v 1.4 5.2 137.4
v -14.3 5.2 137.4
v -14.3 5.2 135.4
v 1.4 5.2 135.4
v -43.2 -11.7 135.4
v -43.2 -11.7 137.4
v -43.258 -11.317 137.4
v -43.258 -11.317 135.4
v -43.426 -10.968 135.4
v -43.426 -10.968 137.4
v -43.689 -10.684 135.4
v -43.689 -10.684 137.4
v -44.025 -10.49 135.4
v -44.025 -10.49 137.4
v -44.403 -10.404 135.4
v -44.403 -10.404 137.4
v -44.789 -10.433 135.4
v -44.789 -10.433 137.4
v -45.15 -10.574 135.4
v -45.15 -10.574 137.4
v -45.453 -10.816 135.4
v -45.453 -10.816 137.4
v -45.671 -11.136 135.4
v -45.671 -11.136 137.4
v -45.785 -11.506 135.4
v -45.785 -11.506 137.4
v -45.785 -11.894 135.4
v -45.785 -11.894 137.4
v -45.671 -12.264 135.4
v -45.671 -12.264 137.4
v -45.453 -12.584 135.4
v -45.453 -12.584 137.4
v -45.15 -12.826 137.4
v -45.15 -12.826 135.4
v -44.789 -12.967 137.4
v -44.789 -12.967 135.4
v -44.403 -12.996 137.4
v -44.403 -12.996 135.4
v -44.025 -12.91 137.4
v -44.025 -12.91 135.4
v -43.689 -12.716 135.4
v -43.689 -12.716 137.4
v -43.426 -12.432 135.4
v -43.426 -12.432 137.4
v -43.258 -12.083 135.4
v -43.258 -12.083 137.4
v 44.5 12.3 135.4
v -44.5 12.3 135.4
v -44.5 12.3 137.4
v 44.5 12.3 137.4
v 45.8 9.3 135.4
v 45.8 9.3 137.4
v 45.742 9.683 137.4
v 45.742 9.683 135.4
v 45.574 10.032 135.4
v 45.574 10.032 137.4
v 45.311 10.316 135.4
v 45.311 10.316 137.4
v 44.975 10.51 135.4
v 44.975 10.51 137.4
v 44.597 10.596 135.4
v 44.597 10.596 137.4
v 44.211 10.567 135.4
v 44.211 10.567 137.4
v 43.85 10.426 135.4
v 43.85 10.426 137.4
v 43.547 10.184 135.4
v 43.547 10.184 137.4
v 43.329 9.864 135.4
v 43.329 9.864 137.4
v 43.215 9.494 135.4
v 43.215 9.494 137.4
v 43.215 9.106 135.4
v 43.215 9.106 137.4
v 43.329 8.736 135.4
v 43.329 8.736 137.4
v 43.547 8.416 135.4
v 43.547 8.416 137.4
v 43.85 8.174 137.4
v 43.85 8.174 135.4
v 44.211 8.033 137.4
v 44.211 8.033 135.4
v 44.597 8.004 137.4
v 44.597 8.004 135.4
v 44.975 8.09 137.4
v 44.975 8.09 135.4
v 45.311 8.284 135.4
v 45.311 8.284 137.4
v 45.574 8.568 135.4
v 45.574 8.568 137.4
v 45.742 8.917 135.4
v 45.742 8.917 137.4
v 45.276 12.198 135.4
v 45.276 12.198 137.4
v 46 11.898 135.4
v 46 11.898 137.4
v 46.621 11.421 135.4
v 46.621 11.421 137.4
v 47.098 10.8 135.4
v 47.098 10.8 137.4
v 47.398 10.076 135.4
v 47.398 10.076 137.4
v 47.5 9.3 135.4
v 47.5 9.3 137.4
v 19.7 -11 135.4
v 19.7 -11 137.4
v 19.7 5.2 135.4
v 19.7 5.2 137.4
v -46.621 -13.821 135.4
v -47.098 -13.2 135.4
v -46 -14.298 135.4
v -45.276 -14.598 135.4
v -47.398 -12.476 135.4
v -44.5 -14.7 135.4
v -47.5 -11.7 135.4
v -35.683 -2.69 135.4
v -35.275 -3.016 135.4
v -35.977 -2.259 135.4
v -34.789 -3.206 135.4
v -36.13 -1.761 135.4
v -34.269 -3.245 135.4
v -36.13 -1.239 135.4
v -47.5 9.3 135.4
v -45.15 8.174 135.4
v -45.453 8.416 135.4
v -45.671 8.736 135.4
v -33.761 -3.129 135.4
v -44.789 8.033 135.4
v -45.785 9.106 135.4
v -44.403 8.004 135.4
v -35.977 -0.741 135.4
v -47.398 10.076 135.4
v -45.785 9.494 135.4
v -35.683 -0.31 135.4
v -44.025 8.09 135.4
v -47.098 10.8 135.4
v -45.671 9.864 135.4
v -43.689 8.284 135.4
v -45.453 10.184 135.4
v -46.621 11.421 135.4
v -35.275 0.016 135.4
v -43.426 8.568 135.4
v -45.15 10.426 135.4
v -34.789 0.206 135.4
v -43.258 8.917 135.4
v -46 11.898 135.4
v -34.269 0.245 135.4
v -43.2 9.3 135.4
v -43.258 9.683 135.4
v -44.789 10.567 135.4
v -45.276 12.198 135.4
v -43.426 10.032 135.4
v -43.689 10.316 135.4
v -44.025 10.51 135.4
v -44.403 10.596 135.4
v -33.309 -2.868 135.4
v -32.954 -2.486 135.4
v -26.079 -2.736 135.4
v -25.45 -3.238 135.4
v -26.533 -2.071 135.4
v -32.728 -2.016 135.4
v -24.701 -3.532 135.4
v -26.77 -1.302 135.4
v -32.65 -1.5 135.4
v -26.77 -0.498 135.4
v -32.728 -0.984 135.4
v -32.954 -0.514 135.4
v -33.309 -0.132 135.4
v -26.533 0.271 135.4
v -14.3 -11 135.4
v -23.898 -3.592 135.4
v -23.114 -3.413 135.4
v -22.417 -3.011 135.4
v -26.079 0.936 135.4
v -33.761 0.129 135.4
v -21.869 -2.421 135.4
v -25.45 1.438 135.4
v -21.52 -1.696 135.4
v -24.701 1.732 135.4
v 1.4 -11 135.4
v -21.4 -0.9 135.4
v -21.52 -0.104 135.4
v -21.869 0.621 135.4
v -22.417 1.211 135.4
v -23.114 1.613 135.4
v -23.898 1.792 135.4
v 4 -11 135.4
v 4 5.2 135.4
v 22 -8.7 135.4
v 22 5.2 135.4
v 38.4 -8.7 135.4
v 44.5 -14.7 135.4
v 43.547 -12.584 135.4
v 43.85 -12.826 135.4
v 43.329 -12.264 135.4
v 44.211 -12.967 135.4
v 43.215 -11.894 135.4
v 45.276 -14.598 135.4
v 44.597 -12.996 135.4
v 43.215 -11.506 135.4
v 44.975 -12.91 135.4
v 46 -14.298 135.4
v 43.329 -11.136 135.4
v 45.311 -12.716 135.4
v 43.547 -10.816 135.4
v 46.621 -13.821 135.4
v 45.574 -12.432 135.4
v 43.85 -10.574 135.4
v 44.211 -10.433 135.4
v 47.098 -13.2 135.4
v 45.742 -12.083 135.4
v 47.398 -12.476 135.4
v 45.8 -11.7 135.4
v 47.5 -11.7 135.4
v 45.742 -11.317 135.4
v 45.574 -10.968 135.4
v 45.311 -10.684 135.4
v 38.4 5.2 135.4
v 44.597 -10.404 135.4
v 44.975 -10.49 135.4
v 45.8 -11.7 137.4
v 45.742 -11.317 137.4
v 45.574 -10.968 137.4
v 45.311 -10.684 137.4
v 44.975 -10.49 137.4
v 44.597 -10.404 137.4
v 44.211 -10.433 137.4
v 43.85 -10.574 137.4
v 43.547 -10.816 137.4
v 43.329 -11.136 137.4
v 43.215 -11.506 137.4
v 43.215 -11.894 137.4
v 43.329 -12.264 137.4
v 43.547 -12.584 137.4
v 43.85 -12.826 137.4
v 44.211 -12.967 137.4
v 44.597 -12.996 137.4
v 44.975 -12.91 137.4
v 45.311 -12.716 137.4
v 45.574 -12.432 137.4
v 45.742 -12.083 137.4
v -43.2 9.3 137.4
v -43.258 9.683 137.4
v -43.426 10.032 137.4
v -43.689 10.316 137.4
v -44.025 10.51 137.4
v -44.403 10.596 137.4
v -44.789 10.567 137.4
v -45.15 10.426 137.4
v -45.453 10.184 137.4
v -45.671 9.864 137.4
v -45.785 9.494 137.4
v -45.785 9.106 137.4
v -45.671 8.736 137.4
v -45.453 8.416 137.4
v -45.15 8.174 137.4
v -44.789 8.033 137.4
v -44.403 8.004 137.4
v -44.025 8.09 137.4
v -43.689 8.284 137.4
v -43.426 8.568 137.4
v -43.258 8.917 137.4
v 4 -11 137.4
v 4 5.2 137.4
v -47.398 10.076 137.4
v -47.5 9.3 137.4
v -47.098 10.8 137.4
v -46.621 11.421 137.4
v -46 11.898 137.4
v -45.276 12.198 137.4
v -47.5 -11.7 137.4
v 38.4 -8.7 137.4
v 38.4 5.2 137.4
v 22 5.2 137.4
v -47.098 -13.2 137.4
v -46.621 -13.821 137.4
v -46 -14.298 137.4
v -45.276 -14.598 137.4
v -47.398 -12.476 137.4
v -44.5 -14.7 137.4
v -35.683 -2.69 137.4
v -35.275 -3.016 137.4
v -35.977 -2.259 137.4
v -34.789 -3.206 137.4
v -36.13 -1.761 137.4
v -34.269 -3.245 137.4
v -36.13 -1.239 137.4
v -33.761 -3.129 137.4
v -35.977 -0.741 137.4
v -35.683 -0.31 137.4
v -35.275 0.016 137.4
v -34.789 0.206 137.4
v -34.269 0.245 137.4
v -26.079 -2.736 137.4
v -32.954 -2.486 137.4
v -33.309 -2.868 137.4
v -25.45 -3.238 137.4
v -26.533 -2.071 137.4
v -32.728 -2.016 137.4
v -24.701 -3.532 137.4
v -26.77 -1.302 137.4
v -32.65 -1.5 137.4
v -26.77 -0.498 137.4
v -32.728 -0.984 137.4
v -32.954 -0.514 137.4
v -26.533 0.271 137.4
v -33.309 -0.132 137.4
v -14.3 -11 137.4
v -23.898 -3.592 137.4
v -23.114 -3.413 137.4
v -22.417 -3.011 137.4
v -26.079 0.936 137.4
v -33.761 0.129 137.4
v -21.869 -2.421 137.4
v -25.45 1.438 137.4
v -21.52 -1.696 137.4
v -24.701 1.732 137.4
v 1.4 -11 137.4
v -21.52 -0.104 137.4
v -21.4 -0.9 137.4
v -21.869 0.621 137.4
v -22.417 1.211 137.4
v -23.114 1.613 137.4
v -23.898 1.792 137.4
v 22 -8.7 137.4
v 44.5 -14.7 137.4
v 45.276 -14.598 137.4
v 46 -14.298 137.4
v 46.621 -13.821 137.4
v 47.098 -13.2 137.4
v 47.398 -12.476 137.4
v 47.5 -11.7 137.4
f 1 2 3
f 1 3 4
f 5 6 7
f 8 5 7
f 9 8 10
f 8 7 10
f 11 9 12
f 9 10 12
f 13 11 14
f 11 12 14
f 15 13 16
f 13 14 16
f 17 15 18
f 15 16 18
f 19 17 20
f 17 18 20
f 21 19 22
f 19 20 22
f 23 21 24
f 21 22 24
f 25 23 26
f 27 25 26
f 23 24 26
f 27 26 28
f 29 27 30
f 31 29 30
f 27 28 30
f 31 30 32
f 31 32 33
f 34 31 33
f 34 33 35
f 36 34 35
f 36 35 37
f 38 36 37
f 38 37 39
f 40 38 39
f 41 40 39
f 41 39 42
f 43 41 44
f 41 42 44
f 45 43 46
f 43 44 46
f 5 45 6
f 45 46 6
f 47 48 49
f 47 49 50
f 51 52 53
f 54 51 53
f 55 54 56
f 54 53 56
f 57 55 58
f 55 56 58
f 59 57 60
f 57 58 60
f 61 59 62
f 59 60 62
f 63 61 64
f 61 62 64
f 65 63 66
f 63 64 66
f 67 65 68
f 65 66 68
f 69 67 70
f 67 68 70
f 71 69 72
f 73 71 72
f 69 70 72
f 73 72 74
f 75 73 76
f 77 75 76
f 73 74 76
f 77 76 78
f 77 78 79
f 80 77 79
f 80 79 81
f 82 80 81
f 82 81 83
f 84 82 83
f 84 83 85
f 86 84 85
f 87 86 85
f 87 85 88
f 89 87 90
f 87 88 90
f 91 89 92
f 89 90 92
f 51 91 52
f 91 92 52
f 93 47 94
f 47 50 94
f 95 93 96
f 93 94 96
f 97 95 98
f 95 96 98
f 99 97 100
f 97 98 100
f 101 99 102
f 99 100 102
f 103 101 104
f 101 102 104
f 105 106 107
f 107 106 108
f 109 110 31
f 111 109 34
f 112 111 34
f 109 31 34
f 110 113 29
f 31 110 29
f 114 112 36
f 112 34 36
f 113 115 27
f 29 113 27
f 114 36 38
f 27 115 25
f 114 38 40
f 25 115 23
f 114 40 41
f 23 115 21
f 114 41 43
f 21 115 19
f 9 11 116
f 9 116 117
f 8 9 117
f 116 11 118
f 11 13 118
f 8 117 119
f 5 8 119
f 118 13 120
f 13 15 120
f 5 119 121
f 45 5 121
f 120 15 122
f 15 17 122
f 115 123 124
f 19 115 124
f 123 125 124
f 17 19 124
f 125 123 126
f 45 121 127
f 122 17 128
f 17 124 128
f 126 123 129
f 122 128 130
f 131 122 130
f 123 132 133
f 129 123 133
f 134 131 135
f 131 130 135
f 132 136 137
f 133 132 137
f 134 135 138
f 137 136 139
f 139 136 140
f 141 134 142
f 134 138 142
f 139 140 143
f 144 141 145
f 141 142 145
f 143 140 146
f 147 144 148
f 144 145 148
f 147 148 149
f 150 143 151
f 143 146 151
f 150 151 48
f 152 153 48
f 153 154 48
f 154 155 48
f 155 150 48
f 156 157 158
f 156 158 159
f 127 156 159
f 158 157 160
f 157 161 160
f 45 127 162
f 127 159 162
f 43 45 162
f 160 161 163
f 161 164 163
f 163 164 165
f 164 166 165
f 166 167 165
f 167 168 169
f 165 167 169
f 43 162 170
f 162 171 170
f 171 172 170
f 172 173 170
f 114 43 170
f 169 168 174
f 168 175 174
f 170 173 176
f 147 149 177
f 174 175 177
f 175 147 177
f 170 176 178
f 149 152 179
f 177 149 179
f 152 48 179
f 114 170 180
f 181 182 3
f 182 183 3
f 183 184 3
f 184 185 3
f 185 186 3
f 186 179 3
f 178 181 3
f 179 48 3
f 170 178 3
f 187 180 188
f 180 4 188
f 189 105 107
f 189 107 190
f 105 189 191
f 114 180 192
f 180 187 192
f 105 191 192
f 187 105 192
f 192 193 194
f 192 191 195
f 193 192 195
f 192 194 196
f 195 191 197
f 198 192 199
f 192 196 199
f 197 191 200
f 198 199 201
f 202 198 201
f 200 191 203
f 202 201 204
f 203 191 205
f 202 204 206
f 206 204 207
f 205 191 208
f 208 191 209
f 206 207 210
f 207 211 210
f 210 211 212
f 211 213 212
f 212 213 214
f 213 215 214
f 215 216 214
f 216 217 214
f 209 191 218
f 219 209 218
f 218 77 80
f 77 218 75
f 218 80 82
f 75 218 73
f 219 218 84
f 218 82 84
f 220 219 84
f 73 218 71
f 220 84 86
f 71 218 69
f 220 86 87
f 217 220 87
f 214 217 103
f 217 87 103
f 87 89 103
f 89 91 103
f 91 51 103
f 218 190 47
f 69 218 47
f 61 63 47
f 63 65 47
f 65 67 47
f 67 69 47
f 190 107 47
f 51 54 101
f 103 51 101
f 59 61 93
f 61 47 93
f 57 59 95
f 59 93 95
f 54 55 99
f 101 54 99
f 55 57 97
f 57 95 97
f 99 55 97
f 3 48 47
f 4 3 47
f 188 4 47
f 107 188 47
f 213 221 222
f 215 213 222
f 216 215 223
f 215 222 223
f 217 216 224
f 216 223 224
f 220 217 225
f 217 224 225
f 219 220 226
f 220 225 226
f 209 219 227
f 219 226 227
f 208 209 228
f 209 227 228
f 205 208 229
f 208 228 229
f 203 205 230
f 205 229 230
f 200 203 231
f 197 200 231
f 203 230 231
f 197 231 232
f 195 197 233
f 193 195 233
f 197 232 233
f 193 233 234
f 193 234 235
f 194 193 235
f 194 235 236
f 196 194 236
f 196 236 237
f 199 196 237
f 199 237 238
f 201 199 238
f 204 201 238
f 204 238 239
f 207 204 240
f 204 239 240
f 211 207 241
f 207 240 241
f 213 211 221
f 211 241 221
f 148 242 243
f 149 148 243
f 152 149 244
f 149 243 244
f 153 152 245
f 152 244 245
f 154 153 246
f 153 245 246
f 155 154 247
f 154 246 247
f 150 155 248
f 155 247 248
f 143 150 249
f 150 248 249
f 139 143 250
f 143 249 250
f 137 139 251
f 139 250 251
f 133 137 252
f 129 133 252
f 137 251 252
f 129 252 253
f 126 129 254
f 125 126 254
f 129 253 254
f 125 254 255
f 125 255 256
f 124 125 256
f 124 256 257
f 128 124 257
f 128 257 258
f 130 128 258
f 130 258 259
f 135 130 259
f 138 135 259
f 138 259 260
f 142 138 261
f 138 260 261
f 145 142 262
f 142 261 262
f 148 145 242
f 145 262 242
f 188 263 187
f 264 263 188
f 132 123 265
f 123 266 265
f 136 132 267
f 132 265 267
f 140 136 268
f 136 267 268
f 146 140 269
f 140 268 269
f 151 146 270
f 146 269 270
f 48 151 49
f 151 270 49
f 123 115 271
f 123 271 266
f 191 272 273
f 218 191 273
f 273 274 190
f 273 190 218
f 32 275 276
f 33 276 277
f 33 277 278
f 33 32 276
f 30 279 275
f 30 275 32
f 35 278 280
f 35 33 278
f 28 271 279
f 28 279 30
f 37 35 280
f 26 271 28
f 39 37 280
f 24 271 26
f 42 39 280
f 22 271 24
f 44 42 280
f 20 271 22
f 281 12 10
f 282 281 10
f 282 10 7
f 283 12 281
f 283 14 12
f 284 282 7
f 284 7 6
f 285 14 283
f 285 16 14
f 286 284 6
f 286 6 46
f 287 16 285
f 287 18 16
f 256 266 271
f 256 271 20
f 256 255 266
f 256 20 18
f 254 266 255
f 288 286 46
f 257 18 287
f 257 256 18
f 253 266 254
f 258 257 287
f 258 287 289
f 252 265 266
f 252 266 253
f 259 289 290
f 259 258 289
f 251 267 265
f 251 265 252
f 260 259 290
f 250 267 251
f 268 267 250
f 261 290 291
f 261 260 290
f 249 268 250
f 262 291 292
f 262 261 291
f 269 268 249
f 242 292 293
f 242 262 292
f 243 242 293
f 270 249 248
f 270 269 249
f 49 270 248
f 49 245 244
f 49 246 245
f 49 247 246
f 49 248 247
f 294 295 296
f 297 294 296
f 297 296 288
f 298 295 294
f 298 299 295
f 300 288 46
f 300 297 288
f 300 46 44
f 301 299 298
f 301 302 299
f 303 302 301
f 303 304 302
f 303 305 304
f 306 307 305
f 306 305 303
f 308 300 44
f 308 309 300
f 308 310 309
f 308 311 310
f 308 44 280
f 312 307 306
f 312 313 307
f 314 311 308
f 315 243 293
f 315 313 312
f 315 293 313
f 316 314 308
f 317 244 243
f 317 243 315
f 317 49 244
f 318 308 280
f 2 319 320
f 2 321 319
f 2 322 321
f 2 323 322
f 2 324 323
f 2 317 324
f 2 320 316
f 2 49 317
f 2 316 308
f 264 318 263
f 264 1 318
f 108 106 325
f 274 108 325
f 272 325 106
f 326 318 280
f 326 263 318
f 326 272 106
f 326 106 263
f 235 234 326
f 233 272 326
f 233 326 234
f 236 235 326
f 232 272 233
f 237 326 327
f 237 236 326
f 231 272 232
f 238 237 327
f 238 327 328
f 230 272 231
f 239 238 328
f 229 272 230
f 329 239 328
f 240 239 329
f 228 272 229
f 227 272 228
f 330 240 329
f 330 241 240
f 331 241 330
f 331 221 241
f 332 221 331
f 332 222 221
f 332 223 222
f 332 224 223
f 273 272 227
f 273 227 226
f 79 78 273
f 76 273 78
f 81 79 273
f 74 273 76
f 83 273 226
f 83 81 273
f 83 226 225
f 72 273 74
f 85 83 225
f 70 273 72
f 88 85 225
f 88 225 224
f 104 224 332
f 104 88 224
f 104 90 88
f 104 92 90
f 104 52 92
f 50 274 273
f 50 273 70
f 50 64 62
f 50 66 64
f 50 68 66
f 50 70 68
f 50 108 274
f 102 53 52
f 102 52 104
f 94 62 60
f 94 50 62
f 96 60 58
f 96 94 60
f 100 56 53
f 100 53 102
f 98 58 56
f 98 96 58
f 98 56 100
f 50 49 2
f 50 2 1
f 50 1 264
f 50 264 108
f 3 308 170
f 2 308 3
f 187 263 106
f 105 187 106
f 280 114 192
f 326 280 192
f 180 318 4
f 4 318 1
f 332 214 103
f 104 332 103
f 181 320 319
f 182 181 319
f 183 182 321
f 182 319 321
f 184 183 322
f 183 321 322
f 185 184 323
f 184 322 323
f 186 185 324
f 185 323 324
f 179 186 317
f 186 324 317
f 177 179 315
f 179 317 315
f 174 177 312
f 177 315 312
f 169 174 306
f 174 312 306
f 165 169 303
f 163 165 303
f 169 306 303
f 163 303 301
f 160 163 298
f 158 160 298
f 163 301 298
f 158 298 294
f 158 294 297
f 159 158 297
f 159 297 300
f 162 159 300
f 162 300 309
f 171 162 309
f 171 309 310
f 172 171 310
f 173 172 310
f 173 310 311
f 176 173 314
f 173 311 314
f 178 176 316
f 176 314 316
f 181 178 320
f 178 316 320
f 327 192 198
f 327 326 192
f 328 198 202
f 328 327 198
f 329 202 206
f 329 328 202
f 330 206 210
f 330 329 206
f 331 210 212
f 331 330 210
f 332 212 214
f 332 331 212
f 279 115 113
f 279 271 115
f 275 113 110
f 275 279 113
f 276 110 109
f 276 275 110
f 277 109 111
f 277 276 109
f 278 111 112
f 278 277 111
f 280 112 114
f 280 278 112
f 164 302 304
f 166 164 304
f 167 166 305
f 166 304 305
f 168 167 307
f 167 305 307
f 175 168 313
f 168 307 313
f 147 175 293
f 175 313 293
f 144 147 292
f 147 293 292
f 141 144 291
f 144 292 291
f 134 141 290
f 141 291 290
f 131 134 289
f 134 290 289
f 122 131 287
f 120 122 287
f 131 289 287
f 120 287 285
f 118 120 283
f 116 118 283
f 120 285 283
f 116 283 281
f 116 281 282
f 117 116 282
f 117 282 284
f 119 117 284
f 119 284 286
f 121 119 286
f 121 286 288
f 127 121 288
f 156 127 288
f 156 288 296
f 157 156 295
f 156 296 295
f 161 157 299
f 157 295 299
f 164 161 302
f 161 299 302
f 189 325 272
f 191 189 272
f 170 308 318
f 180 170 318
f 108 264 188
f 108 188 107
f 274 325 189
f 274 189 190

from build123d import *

# Parameters (mm, degrees)
SKETCH006_W     = 95
SKETCH006_H     = 27
PAD003_DEPTH    = 2
SKETCH007_R     = 1.3
POCKET003_DEPTH = 2
FILLET003_R     = 3
SKETCH008_R     = 1.75
SKETCH008_R_2   = 2.7
POCKET004_DEPTH = 2
SKETCH009_W     = 15.7
SKETCH009_H     = 16.2
SKETCH009_W_2   = 16.4
SKETCH009_H_2   = 13.9
POCKET005_DEPTH = 2


with BuildPart() as part:
    # Sketch006 → Pad003 (new body)
    with BuildSketch(Plane.XY):
        Rectangle(SKETCH006_W, SKETCH006_H)
    extrude(amount=PAD003_DEPTH)

    # Sketch007 (on Face6 of Pad003) → Pocket003 (cut)
    with BuildSketch(Plane.XY.offset(2)):
        with Locations((-44.5, 10.5)):
            Circle(SKETCH007_R)
        with Locations((44.5, 10.5)):
            Circle(SKETCH007_R)
        with Locations((44.5, -10.5)):
            Circle(SKETCH007_R)
        with Locations((-44.5, -10.5)):
            Circle(SKETCH007_R)
    extrude(amount=-POCKET003_DEPTH, mode=Mode.SUBTRACT)

    # Fillet003
    fillet003_edges = [part.edges().sort_by_distance(p)[0] for p in [
        (-47.5, -13.5, 1),
        (47.5, -13.5, 1),
        (47.5, 13.5, 1),
        (-47.5, 13.5, 1),
    ]]
    fillet(fillet003_edges, radius=FILLET003_R)

    # Sketch008 (on Face5 of Fillet003) → Pocket004 (cut)
    with BuildSketch(Plane.XY.offset(2)):
        with Locations((-34.4, -0.3)):
            Circle(SKETCH008_R)
        with Locations((-24.1, 0.3)):
            Circle(SKETCH008_R_2)
    extrude(amount=-POCKET004_DEPTH, mode=Mode.SUBTRACT)

    # Sketch009 (on Face5 of Pocket004) → Pocket005 (cut)
    with BuildSketch(Plane.XY.offset(2)):
        with Locations((-6.45, -1.7)):
            Rectangle(SKETCH009_W, SKETCH009_H)
        with Locations((11.85, -1.7)):
            Rectangle(SKETCH009_W, SKETCH009_H)
        with Locations((30.2, -0.55)):
            Rectangle(SKETCH009_W_2, SKETCH009_H_2)
    extrude(amount=-POCKET005_DEPTH, mode=Mode.SUBTRACT)


with BuildPart() as part_1:
    # Body002 placement: moved
    add(part.part.moved(Location((0, -1.2, 135.4))))


solid = part_1.part
